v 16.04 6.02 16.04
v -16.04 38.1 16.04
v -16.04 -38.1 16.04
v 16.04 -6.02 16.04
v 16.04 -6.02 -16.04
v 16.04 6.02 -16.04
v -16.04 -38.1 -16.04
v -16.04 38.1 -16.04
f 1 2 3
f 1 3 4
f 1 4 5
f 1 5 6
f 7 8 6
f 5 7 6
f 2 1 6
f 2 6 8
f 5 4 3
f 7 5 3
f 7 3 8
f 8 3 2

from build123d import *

# Parameters (mm, degrees)
F0_W     = 32.0802
F0_H     = 76.2
F1_DEPTH = 16.0401
F3_DEPTH = 32.0802


# Not quite as in the source:
# - a pattern or mirror of a feature is missing from the dataset's text; its kind, count and spacing are read off the source's solid


with BuildPart() as f1:
    # F0 (on Top) → F1 (new body, symmetric)
    with BuildSketch(Plane.XY):
        Rectangle(F0_W, F0_H)
    extrude(amount=F1_DEPTH, both=True)

    # F2 (on face) → F3 (cut, through all)
    with BuildSketch(Plane.XY.offset(16.0401)):
        Polygon((-16.0401, -38.1), (16.0401, -38.1), (16.0401, -6.0198), align=None)
    f3 = extrude(amount=-F3_DEPTH, mode=Mode.SUBTRACT)

    # F3_copies: F3 across plane
    add(f3.mirror(Plane.ZX), mode=Mode.SUBTRACT)


solid = f1.part
